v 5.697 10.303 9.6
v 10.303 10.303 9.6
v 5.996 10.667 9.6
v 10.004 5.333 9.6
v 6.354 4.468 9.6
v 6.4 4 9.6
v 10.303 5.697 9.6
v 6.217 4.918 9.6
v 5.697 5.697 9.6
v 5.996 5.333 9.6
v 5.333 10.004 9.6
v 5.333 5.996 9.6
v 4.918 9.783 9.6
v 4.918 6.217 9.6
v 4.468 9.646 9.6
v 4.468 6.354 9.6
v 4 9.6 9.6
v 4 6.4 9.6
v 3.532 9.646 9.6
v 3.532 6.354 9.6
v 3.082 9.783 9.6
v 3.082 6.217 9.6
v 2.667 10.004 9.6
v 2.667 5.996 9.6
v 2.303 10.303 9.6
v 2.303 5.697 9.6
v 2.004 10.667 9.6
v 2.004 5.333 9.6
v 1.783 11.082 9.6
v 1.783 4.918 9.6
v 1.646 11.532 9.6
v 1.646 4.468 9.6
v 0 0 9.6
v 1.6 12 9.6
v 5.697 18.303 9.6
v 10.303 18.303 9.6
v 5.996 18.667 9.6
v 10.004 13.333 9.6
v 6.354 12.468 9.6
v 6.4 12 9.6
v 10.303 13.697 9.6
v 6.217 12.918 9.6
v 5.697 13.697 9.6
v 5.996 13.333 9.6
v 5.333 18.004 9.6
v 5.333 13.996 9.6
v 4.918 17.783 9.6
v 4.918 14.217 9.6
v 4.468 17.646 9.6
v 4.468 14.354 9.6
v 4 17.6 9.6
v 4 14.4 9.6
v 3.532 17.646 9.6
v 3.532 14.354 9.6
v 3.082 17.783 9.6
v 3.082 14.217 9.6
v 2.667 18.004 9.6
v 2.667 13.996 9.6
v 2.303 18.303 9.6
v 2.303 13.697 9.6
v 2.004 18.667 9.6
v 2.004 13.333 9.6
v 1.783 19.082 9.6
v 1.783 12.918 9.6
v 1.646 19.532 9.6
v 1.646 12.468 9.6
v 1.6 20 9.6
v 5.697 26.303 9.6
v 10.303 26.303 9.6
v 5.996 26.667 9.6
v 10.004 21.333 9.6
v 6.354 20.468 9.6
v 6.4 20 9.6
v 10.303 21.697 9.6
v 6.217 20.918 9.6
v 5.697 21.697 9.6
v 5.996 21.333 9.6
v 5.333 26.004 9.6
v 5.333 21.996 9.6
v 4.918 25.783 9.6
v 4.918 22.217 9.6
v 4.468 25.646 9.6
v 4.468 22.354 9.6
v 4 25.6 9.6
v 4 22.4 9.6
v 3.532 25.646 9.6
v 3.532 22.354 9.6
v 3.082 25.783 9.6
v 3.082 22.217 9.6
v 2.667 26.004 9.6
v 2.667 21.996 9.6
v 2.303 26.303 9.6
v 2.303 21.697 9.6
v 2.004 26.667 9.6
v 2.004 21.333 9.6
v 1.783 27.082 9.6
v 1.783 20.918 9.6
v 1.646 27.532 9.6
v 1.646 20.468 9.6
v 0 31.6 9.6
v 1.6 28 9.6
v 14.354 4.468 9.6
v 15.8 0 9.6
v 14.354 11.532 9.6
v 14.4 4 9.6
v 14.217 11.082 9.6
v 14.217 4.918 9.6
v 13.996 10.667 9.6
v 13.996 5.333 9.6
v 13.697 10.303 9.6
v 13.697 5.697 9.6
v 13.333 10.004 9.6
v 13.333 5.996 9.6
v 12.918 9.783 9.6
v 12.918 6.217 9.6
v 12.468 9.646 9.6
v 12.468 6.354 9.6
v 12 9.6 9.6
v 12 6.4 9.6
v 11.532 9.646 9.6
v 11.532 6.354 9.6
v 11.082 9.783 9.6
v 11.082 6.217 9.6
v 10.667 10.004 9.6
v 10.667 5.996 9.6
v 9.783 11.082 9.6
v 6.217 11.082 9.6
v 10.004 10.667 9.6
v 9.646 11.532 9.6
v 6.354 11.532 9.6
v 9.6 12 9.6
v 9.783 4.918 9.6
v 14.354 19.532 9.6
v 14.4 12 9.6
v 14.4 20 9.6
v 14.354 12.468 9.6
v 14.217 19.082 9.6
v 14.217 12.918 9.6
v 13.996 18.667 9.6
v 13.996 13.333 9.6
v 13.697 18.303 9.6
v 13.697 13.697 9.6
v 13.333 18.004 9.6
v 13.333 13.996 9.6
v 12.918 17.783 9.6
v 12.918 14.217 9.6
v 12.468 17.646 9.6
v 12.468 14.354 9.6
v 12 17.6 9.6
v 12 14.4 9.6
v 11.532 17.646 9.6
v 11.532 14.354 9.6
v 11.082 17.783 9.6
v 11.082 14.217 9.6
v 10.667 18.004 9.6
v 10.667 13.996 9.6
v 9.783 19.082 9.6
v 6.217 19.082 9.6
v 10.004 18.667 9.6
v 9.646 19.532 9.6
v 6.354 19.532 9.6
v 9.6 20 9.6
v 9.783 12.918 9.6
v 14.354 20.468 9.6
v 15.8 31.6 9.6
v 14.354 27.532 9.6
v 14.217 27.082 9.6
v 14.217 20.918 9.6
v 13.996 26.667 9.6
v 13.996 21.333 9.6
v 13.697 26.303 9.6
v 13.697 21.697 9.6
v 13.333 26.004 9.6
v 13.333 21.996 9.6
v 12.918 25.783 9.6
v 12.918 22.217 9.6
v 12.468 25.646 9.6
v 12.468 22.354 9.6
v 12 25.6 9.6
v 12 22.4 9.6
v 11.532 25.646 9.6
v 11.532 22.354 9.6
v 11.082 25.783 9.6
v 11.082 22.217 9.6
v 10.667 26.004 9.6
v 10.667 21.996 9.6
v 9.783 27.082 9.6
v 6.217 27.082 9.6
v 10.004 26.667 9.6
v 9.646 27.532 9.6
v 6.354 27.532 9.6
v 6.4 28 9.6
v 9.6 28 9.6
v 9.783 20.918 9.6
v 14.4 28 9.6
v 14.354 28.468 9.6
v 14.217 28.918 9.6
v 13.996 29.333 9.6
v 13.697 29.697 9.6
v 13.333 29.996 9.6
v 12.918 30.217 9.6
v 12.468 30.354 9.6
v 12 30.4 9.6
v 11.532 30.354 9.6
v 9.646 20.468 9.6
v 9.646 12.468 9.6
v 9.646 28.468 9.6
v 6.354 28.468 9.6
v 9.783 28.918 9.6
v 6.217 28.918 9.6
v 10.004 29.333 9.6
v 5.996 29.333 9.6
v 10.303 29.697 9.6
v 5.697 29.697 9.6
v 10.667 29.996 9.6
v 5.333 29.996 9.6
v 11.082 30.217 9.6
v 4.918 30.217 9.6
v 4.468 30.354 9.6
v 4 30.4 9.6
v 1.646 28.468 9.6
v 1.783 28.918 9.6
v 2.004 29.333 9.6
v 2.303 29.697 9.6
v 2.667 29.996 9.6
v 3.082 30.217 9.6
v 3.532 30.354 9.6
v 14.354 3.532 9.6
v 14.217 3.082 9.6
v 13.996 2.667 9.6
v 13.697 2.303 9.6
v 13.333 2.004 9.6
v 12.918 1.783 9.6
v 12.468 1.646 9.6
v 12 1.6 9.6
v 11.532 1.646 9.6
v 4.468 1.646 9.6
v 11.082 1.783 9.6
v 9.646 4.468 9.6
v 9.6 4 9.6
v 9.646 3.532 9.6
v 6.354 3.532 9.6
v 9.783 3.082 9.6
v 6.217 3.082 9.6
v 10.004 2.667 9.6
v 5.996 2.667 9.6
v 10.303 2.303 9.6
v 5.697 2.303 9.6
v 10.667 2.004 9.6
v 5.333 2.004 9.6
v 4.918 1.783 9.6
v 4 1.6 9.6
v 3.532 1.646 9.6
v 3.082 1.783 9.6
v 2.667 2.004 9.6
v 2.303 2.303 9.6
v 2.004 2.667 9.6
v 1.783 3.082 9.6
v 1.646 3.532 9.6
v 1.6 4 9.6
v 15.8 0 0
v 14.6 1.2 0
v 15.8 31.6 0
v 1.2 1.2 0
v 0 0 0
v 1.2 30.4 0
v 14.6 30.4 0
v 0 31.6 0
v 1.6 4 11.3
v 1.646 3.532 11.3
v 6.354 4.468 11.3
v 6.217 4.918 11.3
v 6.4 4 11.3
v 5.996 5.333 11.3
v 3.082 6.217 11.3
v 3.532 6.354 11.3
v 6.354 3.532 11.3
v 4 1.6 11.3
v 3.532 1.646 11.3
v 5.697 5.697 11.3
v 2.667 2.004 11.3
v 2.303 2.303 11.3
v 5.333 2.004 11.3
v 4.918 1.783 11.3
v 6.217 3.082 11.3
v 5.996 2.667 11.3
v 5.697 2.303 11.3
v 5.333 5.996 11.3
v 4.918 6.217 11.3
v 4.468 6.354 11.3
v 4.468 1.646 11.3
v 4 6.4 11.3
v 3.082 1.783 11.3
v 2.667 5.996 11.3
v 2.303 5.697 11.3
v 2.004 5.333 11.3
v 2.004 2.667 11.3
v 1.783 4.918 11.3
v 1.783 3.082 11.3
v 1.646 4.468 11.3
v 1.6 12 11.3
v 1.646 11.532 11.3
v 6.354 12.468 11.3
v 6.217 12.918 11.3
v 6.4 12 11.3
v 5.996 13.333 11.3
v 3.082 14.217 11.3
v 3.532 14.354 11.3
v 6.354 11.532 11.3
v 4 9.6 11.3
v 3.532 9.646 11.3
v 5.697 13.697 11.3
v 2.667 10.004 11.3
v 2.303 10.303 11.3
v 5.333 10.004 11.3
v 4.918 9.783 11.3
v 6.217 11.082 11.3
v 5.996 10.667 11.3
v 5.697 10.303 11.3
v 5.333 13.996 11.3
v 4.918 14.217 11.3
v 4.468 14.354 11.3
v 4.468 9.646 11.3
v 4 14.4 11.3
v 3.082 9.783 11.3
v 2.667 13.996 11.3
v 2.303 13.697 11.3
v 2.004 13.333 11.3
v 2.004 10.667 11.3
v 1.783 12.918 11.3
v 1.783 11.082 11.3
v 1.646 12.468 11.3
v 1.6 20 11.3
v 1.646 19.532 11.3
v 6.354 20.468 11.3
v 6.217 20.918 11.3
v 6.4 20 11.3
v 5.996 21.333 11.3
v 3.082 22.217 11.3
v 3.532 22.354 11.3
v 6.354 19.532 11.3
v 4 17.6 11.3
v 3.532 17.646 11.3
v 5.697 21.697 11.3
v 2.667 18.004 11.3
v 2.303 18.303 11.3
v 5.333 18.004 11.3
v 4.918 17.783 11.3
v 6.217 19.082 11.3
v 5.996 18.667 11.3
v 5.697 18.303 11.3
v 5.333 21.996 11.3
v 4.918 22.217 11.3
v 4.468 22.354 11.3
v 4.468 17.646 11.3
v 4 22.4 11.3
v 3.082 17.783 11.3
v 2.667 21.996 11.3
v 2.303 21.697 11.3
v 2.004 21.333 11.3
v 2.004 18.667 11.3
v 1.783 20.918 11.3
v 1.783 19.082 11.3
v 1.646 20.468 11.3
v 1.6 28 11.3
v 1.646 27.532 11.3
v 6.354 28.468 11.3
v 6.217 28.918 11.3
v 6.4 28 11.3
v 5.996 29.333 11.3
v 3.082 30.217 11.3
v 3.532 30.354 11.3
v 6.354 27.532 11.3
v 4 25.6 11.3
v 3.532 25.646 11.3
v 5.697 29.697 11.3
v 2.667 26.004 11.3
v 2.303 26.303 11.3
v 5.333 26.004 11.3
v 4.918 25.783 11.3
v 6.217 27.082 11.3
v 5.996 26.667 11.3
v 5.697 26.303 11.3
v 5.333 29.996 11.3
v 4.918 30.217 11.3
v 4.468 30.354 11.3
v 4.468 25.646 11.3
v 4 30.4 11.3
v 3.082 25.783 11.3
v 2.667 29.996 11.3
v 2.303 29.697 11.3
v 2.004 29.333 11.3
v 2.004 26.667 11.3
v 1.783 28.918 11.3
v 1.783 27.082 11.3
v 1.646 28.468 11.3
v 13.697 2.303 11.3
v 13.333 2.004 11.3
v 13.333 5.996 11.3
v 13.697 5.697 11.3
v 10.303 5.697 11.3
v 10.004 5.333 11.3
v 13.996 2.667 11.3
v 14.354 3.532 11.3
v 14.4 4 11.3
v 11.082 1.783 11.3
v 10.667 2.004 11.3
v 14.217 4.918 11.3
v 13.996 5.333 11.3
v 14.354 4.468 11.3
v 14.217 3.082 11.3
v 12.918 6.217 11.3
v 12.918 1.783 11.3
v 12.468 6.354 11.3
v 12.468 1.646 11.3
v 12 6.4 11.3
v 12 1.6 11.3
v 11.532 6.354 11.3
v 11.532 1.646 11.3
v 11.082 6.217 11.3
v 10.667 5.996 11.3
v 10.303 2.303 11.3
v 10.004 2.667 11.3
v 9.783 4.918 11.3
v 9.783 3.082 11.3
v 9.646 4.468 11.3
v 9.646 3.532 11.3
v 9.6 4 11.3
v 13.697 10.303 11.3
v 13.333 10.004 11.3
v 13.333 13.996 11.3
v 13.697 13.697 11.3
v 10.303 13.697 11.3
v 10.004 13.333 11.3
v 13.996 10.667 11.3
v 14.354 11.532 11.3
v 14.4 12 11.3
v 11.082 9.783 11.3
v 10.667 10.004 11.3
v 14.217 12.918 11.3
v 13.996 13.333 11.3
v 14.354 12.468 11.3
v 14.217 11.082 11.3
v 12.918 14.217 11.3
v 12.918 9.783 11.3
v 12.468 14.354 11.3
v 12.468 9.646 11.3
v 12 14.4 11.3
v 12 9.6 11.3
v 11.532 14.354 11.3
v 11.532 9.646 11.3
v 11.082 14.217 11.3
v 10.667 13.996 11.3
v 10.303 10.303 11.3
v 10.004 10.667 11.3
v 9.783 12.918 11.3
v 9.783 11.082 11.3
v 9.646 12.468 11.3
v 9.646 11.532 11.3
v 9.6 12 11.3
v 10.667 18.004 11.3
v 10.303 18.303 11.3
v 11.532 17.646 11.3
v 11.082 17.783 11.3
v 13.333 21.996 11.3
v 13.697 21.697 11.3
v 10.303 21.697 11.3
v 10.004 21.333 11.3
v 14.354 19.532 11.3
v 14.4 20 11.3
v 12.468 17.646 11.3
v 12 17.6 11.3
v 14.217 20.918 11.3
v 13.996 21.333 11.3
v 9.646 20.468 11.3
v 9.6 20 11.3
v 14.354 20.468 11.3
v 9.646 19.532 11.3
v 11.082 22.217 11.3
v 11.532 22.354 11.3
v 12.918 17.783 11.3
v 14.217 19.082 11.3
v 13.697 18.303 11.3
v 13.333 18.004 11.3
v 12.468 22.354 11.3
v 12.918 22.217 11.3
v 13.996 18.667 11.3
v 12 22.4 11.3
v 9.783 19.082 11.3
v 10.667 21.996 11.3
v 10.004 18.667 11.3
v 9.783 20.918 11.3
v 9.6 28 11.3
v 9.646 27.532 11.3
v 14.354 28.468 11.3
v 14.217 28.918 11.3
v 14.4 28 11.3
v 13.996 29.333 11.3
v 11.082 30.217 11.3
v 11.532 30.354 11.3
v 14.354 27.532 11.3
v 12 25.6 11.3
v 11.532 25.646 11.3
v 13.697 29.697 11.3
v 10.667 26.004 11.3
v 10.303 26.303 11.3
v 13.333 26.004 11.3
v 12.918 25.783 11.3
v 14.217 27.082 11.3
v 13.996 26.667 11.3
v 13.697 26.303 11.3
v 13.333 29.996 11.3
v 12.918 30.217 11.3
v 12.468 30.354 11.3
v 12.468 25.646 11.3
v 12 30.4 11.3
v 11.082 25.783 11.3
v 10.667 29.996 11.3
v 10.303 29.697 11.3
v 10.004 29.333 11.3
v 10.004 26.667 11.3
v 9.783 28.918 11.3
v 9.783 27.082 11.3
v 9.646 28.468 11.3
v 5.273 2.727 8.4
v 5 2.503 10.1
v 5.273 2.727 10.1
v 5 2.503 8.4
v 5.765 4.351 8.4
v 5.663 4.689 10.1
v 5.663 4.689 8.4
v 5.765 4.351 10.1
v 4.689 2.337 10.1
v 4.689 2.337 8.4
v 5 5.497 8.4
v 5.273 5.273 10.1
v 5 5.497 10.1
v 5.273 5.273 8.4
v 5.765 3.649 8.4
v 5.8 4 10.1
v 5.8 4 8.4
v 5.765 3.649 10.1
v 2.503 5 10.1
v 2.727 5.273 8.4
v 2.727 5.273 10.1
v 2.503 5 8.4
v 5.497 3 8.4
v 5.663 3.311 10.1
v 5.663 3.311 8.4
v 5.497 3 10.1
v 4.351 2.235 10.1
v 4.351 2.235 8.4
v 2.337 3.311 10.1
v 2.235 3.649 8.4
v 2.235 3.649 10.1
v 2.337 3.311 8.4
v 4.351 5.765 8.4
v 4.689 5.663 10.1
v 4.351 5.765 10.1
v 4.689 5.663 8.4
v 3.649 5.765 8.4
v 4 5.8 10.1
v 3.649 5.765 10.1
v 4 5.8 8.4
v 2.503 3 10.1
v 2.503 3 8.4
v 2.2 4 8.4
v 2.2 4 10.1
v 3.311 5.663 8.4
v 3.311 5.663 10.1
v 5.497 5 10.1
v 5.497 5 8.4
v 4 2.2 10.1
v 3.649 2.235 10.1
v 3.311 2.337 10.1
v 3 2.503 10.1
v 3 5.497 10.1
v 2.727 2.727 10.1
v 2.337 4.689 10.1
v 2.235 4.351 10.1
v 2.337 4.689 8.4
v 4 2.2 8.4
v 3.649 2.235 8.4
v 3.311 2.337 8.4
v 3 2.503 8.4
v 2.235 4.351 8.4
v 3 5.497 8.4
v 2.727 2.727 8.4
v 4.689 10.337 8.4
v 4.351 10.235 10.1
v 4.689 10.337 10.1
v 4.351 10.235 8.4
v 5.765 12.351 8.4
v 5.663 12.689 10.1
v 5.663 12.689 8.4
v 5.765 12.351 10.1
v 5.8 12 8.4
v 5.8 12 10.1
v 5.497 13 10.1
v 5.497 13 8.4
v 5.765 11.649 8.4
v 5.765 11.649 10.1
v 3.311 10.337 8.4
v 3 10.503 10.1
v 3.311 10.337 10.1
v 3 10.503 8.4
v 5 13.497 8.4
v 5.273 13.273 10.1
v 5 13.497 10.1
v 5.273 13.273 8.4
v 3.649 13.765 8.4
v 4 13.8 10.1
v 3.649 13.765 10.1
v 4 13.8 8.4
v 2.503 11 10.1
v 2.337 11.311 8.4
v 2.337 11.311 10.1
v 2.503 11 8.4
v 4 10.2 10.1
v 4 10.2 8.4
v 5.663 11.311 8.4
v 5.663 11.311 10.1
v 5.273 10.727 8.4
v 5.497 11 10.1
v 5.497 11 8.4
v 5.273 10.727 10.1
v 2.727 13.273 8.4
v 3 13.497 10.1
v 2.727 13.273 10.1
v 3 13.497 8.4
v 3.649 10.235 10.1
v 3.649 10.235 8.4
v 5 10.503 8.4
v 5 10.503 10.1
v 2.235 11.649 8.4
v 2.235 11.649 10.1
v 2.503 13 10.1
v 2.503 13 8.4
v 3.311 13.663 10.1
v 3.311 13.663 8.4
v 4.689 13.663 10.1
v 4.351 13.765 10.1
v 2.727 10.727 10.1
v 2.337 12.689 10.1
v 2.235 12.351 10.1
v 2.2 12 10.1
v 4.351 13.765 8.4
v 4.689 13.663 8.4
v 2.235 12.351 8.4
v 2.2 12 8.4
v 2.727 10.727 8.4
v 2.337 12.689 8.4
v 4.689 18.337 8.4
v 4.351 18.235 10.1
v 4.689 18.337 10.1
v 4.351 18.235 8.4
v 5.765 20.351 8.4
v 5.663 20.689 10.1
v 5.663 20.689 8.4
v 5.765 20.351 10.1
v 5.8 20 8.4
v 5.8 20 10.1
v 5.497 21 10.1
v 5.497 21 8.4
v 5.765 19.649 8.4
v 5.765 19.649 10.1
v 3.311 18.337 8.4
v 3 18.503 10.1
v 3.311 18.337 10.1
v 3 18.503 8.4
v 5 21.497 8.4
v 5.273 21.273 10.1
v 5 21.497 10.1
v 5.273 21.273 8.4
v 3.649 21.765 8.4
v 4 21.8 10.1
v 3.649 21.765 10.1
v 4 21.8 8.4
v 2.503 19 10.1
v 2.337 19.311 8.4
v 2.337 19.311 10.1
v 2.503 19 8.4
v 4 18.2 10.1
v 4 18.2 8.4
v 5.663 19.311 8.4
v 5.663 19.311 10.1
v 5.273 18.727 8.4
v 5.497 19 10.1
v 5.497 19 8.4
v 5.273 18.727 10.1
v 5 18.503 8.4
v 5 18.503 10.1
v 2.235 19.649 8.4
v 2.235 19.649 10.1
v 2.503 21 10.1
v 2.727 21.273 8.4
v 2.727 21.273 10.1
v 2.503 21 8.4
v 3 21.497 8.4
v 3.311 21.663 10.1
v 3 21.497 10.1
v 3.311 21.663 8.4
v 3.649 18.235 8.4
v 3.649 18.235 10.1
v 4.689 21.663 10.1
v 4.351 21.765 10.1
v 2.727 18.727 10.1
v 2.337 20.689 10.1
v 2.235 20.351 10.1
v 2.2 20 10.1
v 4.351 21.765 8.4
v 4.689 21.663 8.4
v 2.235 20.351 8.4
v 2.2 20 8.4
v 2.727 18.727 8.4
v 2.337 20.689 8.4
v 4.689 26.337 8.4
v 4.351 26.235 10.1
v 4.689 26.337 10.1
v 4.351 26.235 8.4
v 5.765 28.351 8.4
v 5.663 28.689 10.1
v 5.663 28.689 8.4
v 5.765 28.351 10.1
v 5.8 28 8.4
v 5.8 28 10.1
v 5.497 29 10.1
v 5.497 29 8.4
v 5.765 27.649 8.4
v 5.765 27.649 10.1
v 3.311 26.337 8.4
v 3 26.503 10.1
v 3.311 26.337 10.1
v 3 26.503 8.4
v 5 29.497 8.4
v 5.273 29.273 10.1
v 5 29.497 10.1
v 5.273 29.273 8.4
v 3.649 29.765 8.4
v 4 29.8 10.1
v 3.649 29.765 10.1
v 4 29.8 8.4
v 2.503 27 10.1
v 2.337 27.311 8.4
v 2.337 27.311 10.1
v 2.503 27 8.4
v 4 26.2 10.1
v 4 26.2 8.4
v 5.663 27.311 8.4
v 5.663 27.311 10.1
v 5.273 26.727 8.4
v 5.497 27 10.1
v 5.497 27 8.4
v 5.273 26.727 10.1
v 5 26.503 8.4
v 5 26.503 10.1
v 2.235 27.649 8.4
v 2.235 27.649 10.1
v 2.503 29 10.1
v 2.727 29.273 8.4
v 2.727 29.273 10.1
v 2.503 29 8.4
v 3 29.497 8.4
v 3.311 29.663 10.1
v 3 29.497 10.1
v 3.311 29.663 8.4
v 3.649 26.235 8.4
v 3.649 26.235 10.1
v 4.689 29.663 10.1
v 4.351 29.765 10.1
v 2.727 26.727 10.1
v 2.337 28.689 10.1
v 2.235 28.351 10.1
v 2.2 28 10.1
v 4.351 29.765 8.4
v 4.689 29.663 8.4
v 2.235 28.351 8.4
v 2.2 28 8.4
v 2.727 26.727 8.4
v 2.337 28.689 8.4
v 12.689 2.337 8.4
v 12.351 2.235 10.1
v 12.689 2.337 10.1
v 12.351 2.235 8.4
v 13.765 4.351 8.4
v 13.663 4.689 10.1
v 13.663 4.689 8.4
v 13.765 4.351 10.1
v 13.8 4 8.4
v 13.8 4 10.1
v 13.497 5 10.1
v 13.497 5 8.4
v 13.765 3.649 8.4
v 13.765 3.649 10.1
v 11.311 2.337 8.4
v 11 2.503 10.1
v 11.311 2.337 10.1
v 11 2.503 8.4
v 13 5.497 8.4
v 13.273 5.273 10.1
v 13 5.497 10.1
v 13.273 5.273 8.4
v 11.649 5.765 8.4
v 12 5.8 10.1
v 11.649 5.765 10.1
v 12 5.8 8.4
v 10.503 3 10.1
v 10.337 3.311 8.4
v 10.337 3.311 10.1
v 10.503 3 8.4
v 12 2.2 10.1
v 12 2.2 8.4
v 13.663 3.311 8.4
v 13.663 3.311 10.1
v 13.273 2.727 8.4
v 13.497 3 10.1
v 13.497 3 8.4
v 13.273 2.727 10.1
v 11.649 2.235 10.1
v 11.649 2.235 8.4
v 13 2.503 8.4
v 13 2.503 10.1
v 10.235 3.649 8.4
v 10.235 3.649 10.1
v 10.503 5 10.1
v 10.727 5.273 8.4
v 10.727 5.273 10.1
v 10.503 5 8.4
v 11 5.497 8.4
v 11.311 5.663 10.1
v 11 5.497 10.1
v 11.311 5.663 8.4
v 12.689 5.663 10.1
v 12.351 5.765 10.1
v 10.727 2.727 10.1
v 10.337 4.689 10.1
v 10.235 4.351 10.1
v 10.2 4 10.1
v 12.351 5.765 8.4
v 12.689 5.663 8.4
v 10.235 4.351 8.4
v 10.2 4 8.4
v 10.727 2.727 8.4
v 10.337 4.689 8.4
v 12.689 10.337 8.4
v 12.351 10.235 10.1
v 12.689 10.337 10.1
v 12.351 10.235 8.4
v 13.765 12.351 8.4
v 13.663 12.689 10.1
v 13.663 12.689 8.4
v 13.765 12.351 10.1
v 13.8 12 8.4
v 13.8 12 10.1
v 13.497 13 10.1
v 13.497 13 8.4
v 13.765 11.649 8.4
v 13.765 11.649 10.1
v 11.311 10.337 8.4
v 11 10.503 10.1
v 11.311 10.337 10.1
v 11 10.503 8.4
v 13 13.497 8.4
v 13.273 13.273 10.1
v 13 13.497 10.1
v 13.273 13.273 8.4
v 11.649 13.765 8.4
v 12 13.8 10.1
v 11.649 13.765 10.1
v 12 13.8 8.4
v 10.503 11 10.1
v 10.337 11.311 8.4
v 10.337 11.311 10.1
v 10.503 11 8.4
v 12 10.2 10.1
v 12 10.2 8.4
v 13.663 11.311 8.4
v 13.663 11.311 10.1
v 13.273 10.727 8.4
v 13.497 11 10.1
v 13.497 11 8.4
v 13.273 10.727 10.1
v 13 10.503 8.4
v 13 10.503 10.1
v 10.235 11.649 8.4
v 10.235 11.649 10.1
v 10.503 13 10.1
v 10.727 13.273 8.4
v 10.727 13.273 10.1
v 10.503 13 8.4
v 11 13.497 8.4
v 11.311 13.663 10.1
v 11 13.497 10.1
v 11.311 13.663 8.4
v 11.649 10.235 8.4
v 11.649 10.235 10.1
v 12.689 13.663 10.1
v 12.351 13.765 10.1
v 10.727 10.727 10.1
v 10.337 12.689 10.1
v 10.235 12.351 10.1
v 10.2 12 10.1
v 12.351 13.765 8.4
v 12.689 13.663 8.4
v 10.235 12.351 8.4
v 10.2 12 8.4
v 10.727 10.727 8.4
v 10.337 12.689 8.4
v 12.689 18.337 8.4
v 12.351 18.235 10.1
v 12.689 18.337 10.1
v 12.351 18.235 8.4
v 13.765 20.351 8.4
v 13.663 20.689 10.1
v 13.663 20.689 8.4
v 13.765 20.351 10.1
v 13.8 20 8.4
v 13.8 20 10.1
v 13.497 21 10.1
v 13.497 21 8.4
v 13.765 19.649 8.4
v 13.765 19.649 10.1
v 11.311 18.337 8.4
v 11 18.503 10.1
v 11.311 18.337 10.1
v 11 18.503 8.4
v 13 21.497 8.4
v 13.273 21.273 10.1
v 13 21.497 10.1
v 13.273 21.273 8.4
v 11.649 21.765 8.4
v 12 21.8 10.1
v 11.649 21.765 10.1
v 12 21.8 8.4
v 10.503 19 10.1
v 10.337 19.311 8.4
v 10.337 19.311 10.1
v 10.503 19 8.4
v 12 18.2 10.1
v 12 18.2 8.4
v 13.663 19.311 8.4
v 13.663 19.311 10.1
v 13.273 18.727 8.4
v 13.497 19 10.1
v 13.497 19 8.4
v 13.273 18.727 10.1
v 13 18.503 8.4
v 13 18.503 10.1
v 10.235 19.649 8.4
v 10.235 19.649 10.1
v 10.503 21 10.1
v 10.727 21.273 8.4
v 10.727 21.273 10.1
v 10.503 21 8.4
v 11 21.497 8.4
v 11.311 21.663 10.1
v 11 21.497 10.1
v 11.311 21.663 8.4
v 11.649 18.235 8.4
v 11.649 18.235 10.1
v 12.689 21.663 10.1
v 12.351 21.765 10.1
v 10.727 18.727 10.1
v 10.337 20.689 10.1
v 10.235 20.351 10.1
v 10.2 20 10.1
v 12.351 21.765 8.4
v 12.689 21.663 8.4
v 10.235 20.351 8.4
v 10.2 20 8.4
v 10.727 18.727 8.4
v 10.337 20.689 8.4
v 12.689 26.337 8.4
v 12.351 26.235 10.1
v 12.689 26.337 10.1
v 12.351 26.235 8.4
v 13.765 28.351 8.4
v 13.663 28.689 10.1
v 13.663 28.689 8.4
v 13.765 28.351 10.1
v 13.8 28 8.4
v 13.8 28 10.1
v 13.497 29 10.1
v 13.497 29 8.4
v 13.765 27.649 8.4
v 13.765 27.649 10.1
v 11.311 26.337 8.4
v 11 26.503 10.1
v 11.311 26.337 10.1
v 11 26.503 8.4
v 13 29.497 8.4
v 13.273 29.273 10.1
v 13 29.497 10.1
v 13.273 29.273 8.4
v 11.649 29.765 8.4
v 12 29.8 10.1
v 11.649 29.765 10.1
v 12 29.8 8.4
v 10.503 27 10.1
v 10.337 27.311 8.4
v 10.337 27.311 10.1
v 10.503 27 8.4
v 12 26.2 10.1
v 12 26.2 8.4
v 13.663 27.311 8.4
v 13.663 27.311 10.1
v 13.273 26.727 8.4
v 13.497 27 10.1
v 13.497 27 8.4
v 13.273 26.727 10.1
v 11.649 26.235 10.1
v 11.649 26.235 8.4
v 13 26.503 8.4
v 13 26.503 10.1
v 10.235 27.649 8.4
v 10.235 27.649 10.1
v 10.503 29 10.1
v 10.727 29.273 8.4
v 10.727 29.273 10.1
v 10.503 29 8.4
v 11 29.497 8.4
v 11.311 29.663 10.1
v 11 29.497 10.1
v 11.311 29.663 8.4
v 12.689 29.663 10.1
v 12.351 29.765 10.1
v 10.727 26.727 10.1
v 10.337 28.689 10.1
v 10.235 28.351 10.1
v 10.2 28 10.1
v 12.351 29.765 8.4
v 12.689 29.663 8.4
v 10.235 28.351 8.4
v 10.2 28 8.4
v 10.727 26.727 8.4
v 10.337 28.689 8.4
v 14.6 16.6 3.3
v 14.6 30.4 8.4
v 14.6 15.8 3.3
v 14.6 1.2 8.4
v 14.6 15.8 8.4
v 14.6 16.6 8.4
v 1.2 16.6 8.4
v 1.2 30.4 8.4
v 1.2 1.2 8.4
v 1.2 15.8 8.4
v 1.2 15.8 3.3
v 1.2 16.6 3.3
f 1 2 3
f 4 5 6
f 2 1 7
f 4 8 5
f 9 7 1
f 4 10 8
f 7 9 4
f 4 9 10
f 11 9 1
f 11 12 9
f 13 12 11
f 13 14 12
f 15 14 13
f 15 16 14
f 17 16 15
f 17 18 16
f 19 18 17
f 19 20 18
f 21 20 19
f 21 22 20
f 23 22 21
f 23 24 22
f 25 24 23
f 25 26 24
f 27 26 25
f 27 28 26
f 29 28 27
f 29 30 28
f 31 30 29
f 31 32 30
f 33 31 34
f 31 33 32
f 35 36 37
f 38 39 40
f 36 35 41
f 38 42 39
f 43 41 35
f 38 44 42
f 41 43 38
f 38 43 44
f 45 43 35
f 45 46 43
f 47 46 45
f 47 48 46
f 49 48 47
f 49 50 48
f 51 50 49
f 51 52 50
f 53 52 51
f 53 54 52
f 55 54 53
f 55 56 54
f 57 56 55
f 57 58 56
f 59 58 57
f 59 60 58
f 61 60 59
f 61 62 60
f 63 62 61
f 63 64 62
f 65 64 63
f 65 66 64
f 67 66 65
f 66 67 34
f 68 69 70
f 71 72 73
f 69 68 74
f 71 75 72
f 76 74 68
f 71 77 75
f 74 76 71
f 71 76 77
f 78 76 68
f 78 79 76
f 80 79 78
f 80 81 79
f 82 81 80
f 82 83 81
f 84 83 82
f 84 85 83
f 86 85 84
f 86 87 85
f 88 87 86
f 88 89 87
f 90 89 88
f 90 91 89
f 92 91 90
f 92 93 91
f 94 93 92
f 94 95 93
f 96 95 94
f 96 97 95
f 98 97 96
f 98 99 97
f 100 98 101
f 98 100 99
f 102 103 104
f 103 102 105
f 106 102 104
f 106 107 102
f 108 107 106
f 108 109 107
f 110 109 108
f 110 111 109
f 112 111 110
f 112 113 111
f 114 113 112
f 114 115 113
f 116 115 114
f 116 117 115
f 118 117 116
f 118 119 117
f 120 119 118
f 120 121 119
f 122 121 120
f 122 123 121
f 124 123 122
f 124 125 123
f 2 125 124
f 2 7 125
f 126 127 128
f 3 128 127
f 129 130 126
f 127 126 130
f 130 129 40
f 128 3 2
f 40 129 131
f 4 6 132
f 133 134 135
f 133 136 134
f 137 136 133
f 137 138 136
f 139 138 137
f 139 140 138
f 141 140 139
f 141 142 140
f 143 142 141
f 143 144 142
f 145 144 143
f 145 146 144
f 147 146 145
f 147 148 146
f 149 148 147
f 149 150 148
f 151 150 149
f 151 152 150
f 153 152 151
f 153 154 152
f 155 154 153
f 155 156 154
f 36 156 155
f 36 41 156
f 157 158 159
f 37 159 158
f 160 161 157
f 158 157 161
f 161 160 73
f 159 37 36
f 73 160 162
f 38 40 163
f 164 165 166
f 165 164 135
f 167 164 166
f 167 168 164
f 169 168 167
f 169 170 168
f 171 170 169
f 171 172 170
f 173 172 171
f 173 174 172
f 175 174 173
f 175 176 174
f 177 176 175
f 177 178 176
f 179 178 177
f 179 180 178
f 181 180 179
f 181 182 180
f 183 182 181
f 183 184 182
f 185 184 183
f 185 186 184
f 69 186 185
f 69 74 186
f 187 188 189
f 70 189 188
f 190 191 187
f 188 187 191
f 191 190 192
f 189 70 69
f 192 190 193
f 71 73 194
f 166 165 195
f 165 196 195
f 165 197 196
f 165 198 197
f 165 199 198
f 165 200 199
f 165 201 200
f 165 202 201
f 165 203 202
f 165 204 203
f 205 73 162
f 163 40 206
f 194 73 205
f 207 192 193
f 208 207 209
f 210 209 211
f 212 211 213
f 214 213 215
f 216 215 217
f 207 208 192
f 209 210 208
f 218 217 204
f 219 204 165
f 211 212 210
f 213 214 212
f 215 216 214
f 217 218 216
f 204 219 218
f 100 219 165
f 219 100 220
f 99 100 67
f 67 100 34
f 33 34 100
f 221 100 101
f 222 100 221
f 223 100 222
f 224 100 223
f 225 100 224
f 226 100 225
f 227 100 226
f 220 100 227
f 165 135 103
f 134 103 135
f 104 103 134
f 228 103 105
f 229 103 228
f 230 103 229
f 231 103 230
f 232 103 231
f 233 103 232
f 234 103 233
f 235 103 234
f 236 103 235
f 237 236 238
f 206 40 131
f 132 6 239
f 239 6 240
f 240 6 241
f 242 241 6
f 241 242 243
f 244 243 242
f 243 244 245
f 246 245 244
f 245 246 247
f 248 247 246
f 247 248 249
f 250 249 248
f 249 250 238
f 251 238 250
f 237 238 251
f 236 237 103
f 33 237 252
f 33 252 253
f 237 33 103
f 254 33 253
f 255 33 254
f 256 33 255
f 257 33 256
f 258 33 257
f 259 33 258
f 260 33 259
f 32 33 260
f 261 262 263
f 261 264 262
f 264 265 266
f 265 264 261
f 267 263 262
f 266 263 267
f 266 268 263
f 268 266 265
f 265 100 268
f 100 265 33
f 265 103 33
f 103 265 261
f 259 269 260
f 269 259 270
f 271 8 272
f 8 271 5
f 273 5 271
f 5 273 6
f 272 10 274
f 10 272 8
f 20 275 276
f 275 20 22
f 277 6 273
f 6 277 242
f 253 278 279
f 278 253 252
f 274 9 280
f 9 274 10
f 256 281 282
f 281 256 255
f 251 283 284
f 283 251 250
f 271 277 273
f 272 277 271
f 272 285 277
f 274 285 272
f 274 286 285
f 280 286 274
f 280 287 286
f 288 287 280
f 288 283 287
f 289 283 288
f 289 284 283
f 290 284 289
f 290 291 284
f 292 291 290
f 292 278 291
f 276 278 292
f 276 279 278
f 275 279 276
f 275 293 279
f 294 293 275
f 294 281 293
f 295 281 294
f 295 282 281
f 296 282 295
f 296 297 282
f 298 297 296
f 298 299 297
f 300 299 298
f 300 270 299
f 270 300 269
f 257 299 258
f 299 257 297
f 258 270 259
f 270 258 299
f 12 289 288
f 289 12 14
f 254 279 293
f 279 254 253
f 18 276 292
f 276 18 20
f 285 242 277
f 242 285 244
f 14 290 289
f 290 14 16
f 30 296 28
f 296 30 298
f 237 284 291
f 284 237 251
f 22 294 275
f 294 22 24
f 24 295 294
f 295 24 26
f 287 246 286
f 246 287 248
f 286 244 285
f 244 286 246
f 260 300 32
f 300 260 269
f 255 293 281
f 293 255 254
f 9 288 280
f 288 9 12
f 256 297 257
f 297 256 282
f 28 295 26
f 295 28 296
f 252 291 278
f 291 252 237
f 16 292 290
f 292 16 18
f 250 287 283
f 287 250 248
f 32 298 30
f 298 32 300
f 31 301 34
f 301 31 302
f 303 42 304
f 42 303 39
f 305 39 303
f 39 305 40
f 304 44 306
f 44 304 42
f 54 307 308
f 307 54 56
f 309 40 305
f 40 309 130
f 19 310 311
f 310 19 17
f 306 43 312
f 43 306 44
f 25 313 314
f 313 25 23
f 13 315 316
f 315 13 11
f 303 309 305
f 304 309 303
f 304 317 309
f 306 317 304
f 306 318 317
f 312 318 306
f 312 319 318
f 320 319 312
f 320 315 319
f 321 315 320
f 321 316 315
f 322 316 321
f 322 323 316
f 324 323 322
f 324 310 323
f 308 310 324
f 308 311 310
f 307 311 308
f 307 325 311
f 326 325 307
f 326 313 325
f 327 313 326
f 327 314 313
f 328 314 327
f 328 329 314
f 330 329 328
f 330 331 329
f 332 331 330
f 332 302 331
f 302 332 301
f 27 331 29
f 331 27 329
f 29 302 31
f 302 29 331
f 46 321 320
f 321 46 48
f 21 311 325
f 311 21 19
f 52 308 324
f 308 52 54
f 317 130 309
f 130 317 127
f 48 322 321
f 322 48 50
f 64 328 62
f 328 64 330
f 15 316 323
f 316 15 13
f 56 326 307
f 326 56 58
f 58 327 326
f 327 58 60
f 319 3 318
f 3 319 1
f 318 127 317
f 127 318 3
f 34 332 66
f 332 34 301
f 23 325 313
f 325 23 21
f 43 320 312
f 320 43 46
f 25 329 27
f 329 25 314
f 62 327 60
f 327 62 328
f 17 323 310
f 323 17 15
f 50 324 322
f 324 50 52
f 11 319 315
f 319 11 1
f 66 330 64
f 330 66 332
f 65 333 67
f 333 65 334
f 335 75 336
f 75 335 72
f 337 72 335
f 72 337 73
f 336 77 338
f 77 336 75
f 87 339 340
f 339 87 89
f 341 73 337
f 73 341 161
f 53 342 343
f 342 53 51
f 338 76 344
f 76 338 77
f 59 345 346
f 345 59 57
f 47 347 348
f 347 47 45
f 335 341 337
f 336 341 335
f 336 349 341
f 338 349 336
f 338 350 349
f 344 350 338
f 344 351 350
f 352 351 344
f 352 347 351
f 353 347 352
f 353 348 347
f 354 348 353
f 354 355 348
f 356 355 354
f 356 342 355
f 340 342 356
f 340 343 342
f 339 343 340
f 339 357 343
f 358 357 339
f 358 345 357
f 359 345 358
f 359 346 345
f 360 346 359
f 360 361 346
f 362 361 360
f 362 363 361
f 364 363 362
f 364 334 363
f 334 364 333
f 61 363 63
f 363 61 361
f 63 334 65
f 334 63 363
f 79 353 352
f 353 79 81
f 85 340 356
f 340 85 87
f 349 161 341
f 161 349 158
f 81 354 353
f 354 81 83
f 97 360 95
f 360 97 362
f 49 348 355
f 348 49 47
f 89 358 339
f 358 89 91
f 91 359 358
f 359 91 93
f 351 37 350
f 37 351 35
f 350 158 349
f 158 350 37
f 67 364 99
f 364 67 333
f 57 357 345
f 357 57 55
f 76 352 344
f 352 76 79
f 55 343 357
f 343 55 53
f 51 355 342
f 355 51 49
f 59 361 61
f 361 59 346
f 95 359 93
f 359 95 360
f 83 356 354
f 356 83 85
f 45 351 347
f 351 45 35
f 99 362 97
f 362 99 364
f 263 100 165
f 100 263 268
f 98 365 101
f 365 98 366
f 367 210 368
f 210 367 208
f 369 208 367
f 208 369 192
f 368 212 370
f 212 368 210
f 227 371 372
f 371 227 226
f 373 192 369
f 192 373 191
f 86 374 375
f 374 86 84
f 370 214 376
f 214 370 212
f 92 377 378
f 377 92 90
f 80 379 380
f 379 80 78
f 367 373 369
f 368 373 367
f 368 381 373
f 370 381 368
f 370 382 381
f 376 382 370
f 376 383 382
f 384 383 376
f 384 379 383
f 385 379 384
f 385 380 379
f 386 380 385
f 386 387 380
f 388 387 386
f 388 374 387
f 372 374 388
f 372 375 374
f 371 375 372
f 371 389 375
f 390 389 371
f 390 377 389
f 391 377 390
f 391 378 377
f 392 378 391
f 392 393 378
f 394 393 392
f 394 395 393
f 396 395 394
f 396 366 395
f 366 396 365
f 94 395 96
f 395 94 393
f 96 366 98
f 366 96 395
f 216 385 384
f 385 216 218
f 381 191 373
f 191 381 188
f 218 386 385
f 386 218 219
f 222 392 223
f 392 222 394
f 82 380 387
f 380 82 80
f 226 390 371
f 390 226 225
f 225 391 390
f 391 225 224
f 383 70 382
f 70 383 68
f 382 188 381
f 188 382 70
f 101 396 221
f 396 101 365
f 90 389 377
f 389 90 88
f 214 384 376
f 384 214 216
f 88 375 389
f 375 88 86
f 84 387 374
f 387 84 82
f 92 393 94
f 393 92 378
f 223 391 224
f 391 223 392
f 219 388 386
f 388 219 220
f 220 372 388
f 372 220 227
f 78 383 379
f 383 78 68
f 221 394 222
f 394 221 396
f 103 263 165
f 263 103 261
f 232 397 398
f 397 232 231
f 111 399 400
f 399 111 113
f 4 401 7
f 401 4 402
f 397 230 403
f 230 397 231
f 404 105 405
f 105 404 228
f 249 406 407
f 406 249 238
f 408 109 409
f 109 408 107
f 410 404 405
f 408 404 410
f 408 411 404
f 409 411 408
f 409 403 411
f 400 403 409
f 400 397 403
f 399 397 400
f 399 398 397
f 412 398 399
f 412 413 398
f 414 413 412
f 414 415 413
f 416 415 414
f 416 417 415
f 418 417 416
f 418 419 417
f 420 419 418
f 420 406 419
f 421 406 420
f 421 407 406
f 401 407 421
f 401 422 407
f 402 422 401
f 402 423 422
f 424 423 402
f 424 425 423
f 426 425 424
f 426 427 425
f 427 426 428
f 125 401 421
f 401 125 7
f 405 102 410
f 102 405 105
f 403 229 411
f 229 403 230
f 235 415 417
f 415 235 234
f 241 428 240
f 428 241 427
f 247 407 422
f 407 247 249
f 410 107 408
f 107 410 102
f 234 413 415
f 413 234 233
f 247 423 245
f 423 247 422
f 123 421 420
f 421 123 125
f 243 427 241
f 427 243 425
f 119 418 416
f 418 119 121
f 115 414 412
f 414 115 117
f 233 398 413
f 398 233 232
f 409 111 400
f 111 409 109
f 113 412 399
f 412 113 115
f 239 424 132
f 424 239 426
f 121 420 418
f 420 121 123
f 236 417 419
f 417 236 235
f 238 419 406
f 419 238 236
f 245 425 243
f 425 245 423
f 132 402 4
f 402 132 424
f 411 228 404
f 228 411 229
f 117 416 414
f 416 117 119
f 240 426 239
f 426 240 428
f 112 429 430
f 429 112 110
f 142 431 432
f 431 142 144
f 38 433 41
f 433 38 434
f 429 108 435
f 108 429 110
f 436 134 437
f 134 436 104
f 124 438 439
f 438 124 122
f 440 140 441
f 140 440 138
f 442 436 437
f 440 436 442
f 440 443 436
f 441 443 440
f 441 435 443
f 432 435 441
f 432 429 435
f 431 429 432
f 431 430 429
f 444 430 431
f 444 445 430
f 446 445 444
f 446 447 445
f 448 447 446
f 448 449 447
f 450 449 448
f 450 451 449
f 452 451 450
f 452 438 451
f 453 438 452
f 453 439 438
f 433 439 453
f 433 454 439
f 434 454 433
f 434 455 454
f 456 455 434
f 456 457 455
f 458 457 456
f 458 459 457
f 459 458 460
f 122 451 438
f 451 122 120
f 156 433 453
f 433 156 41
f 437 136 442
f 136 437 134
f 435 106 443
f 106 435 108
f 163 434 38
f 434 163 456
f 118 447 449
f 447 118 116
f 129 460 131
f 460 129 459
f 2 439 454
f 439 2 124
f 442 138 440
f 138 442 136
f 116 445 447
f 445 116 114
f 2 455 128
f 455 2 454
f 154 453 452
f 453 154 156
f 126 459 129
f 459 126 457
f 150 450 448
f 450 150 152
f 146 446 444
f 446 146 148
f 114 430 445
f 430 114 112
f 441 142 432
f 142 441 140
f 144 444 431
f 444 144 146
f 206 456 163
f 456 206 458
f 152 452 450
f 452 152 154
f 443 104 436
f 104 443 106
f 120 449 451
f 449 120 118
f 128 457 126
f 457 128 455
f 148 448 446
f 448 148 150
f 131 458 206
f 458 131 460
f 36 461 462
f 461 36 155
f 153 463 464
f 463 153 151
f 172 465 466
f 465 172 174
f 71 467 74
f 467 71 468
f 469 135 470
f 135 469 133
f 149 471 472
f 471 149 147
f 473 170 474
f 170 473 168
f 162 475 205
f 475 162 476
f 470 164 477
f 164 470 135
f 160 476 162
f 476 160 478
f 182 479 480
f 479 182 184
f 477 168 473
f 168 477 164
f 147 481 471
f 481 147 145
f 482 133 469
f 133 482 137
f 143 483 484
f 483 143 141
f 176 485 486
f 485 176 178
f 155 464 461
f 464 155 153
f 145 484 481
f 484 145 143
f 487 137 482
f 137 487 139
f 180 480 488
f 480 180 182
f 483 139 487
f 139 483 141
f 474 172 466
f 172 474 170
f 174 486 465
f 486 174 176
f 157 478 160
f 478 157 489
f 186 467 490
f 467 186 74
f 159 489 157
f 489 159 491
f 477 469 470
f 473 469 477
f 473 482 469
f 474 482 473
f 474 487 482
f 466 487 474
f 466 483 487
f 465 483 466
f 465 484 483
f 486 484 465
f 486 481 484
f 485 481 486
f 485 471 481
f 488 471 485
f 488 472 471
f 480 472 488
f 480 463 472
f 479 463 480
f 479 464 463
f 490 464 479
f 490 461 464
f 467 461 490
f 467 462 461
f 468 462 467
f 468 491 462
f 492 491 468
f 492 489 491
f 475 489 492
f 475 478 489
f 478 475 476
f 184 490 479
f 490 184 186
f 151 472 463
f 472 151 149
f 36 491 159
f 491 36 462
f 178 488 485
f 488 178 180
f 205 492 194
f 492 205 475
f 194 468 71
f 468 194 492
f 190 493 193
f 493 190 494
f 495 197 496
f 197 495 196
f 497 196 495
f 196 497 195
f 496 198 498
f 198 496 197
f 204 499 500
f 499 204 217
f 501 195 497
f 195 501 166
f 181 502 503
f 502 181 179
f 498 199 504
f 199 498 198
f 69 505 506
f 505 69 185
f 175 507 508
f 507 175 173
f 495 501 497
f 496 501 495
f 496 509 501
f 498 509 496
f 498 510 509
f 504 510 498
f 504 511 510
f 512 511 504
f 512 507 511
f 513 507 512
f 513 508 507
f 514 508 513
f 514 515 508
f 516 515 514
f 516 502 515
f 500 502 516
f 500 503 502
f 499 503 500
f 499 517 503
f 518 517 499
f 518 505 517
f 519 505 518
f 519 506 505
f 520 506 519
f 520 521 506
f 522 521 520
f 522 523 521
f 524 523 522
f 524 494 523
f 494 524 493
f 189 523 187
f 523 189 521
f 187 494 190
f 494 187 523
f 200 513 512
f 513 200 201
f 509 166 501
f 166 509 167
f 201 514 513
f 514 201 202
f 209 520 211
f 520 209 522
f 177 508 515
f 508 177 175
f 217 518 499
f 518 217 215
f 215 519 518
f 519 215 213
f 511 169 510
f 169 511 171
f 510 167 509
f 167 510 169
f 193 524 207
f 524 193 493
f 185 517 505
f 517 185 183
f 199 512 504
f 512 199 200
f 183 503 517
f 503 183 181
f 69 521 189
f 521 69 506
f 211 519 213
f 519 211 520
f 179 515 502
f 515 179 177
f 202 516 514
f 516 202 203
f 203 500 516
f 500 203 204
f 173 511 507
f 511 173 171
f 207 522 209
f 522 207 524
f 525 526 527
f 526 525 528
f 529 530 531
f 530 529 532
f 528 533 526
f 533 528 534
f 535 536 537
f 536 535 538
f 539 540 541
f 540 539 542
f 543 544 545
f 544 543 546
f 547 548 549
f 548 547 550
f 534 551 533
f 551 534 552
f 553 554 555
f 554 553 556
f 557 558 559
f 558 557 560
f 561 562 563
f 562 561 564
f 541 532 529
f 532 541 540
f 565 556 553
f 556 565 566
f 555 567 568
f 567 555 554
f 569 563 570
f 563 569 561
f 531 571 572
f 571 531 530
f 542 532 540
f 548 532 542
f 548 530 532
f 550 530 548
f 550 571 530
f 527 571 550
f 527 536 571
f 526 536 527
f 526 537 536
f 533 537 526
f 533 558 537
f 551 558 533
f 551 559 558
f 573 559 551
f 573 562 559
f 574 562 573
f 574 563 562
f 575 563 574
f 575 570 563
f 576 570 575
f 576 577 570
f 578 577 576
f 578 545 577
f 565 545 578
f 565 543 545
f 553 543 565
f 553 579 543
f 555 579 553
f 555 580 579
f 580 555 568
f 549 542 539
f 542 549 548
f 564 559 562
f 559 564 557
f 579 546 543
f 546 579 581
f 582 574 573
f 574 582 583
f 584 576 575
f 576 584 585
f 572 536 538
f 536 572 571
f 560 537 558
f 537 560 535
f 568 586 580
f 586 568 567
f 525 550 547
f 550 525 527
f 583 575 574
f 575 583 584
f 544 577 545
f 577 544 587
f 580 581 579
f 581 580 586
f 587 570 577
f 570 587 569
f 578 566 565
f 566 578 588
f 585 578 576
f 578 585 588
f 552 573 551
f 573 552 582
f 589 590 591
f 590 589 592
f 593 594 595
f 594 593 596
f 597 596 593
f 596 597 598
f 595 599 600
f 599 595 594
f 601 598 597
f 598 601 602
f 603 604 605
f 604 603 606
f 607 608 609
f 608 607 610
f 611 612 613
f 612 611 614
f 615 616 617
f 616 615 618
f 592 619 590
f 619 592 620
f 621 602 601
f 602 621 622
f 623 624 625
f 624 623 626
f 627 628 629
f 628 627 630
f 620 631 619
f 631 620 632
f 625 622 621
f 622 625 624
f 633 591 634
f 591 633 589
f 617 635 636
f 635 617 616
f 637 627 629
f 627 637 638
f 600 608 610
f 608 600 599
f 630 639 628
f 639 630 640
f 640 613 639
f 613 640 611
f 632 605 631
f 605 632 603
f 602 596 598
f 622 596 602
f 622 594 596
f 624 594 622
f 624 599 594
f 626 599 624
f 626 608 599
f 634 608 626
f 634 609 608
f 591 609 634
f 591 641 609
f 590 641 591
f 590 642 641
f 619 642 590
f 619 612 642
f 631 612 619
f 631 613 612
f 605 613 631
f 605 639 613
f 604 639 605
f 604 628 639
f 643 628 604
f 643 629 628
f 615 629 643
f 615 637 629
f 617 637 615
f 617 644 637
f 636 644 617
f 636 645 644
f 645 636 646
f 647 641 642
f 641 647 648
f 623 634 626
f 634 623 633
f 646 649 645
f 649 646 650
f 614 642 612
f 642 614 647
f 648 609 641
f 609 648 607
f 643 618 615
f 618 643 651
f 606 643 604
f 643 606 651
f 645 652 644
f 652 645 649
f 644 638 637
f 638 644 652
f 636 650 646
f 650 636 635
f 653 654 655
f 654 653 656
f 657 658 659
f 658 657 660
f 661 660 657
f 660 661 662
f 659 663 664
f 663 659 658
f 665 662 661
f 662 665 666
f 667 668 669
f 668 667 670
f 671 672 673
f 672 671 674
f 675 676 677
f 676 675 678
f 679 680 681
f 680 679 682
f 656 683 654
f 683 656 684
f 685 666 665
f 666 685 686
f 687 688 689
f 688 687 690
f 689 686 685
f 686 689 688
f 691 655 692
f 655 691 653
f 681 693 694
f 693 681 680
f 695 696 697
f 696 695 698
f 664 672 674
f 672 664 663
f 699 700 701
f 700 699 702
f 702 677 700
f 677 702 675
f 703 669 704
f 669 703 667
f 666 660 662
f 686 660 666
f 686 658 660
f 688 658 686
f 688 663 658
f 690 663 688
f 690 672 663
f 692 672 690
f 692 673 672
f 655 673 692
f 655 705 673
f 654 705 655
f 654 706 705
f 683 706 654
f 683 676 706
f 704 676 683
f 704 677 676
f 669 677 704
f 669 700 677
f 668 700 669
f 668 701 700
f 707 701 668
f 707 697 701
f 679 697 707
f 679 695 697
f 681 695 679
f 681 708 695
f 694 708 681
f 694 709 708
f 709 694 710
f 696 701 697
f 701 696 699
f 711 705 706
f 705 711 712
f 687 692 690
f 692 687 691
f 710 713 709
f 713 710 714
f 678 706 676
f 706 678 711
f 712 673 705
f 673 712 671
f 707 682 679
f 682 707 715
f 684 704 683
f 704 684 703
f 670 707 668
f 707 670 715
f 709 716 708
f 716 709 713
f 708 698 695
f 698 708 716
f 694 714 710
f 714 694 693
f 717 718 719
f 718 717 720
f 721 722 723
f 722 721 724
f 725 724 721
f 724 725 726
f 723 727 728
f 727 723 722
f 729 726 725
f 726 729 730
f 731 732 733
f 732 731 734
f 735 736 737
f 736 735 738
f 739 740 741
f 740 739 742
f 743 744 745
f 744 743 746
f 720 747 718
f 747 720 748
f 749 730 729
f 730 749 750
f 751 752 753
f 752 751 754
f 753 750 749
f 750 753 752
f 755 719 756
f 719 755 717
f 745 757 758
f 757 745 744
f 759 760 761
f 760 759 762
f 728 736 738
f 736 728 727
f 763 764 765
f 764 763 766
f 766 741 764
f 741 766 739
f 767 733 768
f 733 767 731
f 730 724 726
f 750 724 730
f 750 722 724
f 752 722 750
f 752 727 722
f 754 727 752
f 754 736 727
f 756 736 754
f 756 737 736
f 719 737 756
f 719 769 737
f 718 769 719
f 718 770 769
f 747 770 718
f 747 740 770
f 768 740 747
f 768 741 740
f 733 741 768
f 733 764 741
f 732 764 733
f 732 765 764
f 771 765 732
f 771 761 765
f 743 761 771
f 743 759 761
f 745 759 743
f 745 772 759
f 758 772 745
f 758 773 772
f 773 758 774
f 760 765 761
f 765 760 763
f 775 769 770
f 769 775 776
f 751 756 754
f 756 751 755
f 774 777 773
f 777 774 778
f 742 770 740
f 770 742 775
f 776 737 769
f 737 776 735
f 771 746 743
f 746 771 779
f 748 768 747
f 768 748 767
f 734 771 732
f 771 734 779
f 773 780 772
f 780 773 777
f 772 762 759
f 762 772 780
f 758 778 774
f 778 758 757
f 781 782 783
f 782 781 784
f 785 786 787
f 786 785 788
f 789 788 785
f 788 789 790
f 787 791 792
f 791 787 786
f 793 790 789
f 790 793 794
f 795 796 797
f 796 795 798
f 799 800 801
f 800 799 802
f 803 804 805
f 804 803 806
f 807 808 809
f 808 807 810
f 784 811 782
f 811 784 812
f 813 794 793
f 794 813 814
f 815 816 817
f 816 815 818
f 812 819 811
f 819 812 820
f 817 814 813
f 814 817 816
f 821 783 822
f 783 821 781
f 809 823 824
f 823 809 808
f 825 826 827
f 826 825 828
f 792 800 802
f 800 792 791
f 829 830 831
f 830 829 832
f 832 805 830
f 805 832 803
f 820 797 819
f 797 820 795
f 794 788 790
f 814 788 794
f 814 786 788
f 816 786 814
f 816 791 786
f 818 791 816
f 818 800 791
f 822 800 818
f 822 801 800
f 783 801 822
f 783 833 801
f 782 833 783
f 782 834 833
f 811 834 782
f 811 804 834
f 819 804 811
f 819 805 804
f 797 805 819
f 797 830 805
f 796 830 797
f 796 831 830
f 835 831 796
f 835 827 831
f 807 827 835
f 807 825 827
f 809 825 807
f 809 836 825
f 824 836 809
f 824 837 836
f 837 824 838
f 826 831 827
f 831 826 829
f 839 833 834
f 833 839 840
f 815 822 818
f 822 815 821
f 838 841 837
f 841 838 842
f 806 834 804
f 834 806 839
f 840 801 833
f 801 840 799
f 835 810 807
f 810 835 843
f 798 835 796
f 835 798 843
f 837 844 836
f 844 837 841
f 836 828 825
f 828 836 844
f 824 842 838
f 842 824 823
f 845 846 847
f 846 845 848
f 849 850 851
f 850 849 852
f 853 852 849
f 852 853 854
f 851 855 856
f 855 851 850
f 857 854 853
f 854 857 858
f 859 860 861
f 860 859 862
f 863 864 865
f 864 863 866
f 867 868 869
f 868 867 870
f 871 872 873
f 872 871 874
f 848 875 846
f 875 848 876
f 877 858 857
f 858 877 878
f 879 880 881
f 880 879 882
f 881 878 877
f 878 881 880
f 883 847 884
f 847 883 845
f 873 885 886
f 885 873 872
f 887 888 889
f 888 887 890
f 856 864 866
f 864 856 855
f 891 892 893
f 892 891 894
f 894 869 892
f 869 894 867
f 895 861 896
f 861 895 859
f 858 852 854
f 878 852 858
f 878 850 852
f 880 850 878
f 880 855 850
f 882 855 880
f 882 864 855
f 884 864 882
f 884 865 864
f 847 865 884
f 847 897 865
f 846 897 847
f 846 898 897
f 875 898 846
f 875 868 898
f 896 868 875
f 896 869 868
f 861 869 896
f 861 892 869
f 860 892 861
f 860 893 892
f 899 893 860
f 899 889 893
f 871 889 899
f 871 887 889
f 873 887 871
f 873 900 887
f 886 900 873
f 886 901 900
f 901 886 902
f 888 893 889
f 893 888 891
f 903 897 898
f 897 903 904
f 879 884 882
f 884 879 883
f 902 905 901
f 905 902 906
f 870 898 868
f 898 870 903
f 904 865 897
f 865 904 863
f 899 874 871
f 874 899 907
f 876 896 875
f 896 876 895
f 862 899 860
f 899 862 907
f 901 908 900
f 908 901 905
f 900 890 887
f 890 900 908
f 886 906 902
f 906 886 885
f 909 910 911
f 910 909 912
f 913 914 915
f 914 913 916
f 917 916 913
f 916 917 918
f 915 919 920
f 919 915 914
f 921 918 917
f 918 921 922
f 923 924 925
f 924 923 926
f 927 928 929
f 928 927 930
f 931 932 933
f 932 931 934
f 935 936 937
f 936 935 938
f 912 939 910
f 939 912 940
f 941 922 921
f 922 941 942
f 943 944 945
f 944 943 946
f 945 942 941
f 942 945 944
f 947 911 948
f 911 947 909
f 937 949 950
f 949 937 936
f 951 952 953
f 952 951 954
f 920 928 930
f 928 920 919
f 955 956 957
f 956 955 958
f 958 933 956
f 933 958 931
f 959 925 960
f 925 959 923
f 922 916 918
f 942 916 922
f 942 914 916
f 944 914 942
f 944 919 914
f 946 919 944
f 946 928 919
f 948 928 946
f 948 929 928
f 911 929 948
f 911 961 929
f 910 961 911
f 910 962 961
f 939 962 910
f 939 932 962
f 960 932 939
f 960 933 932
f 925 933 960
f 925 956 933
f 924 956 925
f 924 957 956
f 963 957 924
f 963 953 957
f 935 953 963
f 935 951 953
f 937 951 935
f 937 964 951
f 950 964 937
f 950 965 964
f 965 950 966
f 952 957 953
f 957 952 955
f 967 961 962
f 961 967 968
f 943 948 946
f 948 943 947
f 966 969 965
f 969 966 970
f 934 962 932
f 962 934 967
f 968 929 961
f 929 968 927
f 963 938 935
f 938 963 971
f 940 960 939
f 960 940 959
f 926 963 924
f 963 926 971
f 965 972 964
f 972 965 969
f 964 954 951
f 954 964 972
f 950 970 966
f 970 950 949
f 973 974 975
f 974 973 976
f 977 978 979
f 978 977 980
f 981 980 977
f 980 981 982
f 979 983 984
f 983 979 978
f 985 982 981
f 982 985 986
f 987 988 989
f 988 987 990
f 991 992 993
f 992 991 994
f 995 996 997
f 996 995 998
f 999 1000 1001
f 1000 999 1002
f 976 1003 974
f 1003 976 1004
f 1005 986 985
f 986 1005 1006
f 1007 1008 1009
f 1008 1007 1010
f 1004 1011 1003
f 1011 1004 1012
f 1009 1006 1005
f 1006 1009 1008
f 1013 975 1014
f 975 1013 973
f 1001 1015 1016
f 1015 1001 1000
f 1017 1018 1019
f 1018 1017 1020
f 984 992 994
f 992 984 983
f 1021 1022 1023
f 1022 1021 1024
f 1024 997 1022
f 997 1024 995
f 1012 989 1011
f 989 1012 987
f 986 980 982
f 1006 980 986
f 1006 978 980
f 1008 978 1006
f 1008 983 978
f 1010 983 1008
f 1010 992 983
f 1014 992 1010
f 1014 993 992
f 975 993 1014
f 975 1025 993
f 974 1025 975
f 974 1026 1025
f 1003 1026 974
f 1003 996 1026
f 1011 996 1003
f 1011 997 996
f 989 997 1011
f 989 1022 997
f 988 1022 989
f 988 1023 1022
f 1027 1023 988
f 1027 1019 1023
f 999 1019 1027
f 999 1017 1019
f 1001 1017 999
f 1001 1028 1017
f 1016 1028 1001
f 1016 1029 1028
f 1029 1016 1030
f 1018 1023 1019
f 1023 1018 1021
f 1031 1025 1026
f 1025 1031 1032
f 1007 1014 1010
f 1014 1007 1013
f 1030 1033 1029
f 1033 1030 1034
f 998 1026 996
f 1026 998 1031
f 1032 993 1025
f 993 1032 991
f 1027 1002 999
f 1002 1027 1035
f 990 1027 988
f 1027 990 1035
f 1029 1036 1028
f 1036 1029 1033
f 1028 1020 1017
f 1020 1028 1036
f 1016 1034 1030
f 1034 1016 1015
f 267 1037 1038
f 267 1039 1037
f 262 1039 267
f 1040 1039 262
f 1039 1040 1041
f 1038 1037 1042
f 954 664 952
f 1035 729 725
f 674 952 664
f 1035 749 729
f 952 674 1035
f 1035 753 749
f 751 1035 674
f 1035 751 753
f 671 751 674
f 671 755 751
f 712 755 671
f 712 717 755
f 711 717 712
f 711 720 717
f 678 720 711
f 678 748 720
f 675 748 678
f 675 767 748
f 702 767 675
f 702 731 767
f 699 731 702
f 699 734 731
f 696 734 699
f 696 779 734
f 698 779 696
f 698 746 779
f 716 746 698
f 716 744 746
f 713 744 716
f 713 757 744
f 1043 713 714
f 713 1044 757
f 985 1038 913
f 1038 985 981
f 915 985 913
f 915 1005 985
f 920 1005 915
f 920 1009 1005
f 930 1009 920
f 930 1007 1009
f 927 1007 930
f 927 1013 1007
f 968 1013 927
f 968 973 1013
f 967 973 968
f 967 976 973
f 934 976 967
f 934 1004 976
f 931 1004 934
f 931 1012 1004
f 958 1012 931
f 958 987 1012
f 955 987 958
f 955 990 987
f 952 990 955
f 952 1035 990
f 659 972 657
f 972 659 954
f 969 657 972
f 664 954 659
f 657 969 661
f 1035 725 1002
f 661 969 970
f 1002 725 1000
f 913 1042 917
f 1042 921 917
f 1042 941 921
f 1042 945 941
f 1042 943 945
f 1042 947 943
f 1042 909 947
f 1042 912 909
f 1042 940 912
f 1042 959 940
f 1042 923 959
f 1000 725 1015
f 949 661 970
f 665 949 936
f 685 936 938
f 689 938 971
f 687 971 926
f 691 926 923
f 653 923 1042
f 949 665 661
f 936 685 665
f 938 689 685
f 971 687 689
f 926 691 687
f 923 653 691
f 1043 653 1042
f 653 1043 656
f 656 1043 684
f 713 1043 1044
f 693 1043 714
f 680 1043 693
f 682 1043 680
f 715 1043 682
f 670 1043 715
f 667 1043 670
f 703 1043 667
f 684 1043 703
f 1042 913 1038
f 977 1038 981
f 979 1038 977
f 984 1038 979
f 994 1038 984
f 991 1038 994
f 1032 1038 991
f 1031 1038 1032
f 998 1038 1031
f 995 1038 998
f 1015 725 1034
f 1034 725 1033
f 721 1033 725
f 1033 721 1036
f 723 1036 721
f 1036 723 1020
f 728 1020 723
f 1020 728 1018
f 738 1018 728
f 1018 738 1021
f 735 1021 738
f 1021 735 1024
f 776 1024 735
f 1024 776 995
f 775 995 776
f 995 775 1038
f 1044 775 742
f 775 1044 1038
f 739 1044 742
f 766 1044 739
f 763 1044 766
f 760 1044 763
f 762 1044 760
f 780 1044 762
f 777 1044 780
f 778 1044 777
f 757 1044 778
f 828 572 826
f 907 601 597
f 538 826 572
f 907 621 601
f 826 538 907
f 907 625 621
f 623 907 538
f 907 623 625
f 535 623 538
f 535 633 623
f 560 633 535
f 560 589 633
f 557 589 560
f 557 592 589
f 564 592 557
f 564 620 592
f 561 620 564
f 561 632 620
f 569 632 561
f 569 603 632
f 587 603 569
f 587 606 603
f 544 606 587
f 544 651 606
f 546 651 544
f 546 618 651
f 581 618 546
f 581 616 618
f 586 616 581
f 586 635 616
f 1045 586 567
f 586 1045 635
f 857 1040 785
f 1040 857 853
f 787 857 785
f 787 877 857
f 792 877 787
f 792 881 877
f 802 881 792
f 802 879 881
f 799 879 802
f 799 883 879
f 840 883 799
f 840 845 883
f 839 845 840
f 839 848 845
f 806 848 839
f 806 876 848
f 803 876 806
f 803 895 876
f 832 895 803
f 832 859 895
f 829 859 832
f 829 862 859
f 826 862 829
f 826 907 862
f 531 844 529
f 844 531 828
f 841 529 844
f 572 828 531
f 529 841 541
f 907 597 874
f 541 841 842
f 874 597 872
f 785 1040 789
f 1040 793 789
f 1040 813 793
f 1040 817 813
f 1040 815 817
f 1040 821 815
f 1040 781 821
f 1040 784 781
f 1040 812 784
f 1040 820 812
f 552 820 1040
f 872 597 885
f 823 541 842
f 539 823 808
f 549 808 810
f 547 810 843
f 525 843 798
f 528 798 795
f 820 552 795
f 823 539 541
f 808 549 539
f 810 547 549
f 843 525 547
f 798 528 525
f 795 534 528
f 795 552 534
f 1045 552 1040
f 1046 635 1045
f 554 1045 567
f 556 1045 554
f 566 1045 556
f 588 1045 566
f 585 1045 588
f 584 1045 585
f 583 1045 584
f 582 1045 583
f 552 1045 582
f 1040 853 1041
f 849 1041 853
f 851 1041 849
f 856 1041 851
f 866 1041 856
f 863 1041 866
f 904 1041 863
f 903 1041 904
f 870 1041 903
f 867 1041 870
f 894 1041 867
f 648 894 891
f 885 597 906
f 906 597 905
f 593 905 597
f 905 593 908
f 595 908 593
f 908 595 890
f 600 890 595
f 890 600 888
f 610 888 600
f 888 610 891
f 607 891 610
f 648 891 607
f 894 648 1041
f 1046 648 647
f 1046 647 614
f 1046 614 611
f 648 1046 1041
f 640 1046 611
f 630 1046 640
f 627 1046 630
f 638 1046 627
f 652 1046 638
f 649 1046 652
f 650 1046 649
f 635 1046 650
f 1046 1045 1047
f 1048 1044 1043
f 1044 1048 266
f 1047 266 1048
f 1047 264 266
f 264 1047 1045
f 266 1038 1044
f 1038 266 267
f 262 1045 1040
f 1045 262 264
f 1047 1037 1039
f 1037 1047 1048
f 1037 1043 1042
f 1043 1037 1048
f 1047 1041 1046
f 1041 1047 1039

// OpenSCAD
module Brick(width = 2, length = 4)
{
    // 1x1
    x = 7.9;
    // wall thickness
    wt = 1.2;
    difference()
    {
        for (l = [1:width])
        {
            for (w = [1:length])
            {
                difference()
                {
                    union()
                    {
                        // brick base shape
                        cube(size = [ x * l, x * w, 9.6 ]);
                        // brick top nubs
                        translate([ (8 * l) - 4, (8 * w) - 4, 9.6 ]) cylinder(h = 1.7, r = 4.8 / 2);
                    }
                }
            }
        }
        for (l = [1:width])
        {
            for (w = [1:length])
            {
                // brick top nubs inner void
                translate([ (8 * l) - 4, (8 * w) - 4, 9.6 - wt - 0.3 ]) cylinder(h = 2, r = (4.8 / 2) - (wt / 2));
            }
        }
        // brick inner void
        translate(v = [ 1.2, 1.2, -1.2 ]) cube(size = [ (7.9 * width) - 1.2 * 2, (7.9 * length) - 1.2 * 2, 9.6 ]);
    }

    // inner brick braces for each 2x2
    for (l = [1:length - 1]) // sub tract 1 from dimention so we don't add unneeded braces
    {
        if (l % 2 == 0)
        {
            translate(v = [ 0, l * x, 9.6 - 6.3 ]) cube(size = [ width * 7.9, 0.8, 6.3 ]);
        }
    }
    for (w = [1:width - 1])
    {
        if (w % 2 == 0)
        {
            translate(v = [ w * x, 0, 9.6 - 6.3 ]) cube(size = [ 0.8, length * 7.9, 6.3 ]);
        }
    }
}
$fn = 32;

Brick();
